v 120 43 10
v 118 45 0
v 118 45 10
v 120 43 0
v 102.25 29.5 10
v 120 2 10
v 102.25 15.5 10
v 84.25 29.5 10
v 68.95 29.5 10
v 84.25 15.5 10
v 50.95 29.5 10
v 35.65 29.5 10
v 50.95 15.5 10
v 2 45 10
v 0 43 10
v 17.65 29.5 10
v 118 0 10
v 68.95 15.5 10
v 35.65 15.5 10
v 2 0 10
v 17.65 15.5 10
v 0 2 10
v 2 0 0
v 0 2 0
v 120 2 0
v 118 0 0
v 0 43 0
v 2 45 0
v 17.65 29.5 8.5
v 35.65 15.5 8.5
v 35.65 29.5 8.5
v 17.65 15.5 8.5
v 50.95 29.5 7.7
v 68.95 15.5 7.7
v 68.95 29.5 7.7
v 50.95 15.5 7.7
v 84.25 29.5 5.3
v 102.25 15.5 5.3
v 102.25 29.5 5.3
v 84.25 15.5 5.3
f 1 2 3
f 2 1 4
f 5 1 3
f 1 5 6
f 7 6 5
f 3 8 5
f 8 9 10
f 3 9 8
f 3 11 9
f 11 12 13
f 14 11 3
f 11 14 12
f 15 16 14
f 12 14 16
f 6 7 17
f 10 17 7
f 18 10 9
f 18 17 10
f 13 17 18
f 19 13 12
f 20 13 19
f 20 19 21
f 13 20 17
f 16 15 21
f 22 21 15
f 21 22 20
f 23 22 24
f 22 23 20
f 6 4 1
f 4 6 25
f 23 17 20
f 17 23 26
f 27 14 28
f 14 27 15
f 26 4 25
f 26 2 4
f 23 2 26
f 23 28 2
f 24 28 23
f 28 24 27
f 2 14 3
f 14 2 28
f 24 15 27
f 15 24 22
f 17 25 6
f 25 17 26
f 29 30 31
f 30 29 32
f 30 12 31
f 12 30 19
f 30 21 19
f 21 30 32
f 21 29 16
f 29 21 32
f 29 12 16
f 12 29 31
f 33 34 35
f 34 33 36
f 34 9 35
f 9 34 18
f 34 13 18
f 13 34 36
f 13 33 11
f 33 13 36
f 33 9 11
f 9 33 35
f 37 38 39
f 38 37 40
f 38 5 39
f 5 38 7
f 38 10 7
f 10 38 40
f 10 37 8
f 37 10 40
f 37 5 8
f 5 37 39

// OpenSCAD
$fn = 32;

// ----------------------------------------------------------------------
// Windowed plate: 3 voids, 120 x 45 x 10 mm
// ----------------------------------------------------------------------

// --- parameters (mm) ---
plate_l = 120;            // plate length, X
plate_w = 45;             // plate width, Y
plate_t = 10;             // plate thickness, Z
edge_margin = 10;         // wall from the plate edge to any window
windows = 3;              // number of windows in the row
win_l = 18;               // window length
win_w = 14;               // window width
win_pitch = 33.3;         // window pitch along X
depth_1 = 1.5;            // depth of void 1 (full thickness = through)
depth_2 = 2.3;            // depth of void 2 (full thickness = through)
depth_3 = 4.7;            // depth of void 3 (full thickness = through)
corner_c = 2;             // corner chamfer of the plate

profile = [[2, 0], [118, 0], [120, 2], [120, 43], [118, 45], [2, 45], [0, 43], [0, 2]];  // primary outline, 8 points, counter clockwise
void_1 = [[17.65, 15.5], [35.65, 15.5], [35.65, 29.5], [17.65, 29.5]];  // window 1 of the row, 4 points
void_2 = [[50.95, 15.5], [68.95, 15.5], [68.95, 29.5], [50.95, 29.5]];  // window 2 of the row, 4 points
void_3 = [[84.25, 15.5], [102.25, 15.5], [102.25, 29.5], [84.25, 29.5]];  // window 3 of the row, 4 points

// --- the one profile operation ---
difference() {
  linear_extrude(height = plate_t) polygon(points = profile);
  translate([0, 0, plate_t - depth_1])
    linear_extrude(height = depth_1 + 1) polygon(points = void_1);
  translate([0, 0, plate_t - depth_2])
    linear_extrude(height = depth_2 + 1) polygon(points = void_2);
  translate([0, 0, plate_t - depth_3])
    linear_extrude(height = depth_3 + 1) polygon(points = void_3);
}
